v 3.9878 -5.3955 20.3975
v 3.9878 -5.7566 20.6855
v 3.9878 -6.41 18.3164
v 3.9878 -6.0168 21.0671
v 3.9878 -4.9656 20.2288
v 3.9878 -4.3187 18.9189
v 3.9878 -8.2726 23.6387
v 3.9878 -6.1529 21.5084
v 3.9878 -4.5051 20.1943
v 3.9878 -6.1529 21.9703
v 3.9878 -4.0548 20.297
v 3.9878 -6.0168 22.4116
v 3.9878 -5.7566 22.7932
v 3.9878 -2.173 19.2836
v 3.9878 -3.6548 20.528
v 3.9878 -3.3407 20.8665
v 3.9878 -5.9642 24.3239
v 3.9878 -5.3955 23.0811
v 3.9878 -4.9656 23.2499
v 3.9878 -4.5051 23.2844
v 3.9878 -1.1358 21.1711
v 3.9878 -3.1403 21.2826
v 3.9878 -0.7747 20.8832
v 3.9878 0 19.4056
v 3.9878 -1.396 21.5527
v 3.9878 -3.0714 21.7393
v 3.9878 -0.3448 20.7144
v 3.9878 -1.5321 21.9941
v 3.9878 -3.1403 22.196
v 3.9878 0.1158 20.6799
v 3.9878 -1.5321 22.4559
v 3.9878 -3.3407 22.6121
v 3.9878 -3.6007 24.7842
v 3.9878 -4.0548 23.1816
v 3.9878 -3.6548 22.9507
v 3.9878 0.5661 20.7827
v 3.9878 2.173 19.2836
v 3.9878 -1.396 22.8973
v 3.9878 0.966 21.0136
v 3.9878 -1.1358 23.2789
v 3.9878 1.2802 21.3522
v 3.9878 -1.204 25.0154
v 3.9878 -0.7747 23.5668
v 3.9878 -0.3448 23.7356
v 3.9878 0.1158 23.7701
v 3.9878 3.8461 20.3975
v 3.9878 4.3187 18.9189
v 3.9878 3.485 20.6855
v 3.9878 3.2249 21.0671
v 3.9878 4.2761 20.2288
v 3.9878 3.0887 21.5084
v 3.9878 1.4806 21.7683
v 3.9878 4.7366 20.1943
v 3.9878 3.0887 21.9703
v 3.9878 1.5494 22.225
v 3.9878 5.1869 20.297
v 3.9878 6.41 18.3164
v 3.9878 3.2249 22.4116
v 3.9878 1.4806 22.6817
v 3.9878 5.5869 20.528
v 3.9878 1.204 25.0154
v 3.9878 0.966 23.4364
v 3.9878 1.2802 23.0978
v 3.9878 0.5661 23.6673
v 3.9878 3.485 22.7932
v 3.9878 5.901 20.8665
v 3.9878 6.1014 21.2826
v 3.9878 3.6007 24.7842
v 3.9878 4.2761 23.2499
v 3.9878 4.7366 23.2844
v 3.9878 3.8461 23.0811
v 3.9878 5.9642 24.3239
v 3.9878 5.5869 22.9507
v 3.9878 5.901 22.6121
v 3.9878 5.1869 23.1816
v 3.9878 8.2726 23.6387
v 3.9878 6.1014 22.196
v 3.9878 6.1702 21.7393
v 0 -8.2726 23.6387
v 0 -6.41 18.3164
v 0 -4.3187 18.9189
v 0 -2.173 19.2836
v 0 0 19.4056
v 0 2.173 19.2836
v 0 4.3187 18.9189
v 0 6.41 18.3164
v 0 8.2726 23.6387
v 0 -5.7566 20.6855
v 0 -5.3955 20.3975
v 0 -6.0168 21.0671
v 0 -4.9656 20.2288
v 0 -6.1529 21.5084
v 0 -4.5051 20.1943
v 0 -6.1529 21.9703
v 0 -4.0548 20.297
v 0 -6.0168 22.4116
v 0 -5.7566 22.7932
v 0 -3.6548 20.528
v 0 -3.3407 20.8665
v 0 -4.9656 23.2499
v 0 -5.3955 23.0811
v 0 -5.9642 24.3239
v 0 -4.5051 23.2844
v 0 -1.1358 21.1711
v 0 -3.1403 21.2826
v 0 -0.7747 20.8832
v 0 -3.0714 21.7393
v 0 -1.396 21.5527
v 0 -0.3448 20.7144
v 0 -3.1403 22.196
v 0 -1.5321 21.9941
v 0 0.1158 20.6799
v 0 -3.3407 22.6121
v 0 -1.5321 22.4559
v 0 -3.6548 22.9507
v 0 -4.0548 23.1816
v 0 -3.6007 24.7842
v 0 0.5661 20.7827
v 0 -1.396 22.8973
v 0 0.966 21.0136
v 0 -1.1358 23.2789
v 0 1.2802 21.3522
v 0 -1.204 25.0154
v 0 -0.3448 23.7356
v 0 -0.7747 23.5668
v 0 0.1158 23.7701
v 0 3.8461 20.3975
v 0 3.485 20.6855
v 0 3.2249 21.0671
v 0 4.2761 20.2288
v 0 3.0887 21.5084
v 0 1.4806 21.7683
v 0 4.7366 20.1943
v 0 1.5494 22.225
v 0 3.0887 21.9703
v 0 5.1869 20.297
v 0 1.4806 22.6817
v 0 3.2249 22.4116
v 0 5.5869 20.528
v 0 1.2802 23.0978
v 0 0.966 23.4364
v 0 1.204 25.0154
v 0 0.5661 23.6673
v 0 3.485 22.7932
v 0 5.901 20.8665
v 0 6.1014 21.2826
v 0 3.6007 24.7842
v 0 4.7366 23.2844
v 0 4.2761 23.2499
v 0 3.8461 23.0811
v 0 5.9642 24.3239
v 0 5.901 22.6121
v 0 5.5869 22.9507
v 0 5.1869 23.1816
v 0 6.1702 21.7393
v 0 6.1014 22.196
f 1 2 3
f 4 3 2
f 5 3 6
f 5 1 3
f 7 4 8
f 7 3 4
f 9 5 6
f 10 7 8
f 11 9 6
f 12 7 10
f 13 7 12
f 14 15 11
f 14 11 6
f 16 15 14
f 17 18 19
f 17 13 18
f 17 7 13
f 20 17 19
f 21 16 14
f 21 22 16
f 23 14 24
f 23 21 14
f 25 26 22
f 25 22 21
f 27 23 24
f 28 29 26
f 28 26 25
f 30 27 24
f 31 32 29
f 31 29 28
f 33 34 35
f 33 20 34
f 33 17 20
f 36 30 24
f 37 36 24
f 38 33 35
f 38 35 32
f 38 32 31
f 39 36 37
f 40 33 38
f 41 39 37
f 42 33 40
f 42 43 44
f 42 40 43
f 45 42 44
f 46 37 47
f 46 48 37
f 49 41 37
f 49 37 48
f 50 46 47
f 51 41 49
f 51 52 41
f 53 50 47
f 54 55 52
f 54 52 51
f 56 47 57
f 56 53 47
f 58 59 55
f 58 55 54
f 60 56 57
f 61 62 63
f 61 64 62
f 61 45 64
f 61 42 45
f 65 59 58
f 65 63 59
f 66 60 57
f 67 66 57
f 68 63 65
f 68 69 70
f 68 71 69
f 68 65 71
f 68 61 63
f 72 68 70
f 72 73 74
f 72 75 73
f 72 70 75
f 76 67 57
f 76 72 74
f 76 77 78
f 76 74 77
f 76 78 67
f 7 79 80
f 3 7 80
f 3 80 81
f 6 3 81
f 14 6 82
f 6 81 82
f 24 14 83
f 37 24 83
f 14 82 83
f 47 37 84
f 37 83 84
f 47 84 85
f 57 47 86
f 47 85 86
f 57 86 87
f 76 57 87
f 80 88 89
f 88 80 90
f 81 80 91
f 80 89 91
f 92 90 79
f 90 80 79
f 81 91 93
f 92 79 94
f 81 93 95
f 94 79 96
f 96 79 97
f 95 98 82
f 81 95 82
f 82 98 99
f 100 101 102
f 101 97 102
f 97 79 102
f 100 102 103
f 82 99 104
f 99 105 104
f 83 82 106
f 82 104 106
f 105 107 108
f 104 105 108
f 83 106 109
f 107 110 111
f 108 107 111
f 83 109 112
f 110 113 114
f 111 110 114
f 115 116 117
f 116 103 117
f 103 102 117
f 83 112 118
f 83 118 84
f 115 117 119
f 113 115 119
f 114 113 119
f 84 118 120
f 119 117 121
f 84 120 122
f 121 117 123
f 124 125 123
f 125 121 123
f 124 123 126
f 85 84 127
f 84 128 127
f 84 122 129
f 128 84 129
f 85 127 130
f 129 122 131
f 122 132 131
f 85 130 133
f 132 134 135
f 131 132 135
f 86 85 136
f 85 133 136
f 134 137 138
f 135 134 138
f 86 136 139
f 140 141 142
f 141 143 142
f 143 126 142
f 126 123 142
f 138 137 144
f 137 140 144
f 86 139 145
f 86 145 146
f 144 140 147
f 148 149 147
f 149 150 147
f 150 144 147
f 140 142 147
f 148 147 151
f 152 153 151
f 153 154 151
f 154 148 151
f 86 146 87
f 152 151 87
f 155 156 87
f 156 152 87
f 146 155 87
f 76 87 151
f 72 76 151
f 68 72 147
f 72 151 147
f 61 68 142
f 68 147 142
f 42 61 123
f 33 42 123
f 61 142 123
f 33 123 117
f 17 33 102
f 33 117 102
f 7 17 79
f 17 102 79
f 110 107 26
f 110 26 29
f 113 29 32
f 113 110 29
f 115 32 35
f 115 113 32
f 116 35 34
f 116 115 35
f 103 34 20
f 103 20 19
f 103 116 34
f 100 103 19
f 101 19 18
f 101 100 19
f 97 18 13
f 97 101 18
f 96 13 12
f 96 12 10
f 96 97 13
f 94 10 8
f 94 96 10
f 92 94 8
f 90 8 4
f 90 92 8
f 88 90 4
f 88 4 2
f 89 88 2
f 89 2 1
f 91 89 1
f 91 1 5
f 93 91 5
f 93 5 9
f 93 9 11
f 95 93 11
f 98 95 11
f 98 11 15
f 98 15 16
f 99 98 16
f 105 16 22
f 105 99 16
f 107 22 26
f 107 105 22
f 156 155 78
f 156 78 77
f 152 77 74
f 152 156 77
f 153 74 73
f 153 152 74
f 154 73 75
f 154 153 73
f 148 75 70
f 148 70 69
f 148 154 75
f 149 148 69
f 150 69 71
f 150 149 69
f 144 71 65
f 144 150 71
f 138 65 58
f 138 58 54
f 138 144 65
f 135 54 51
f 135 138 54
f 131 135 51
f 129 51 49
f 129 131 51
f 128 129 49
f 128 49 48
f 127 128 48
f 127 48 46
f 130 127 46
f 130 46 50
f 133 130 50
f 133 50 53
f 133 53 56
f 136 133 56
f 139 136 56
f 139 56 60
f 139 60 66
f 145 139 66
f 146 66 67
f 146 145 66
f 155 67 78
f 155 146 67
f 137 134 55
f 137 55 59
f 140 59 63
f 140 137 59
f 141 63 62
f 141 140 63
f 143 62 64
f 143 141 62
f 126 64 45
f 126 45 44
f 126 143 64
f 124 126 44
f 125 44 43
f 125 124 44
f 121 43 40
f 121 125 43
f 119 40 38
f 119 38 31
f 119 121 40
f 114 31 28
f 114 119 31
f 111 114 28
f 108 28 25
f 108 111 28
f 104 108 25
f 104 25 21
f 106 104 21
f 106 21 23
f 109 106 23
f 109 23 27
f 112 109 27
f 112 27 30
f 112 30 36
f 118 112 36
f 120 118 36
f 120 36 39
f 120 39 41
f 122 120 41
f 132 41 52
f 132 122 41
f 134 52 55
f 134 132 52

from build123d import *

# Parameters (mm, degrees)
F1_R     = 1.5494
F2_DEPTH = 3.9878


with BuildPart() as f2:
    # F1 (on Right) → F2 (new body)
    with BuildSketch(Plane.YZ):
        with BuildLine():
            ThreePointArc((8.272591, 23.638659), (0, 25.0444), (-8.272591, 23.638659))
            Line((-8.272591, 23.638659), (-6.409999, 18.316365))
            ThreePointArc((-6.409999, 18.316365), (0, 19.4056), (6.409999, 18.316365))
            Line((6.409999, 18.316365), (8.272591, 23.638659))
        make_face()
        with Locations((-4.620837, 21.73933)):
            Circle(F1_R, mode=Mode.SUBTRACT)
        with Locations((0, 22.225)):
            Circle(F1_R, mode=Mode.SUBTRACT)
        with Locations((4.620837, 21.73933)):
            Circle(F1_R, mode=Mode.SUBTRACT)
    extrude(amount=F2_DEPTH)


solid = f2.part
